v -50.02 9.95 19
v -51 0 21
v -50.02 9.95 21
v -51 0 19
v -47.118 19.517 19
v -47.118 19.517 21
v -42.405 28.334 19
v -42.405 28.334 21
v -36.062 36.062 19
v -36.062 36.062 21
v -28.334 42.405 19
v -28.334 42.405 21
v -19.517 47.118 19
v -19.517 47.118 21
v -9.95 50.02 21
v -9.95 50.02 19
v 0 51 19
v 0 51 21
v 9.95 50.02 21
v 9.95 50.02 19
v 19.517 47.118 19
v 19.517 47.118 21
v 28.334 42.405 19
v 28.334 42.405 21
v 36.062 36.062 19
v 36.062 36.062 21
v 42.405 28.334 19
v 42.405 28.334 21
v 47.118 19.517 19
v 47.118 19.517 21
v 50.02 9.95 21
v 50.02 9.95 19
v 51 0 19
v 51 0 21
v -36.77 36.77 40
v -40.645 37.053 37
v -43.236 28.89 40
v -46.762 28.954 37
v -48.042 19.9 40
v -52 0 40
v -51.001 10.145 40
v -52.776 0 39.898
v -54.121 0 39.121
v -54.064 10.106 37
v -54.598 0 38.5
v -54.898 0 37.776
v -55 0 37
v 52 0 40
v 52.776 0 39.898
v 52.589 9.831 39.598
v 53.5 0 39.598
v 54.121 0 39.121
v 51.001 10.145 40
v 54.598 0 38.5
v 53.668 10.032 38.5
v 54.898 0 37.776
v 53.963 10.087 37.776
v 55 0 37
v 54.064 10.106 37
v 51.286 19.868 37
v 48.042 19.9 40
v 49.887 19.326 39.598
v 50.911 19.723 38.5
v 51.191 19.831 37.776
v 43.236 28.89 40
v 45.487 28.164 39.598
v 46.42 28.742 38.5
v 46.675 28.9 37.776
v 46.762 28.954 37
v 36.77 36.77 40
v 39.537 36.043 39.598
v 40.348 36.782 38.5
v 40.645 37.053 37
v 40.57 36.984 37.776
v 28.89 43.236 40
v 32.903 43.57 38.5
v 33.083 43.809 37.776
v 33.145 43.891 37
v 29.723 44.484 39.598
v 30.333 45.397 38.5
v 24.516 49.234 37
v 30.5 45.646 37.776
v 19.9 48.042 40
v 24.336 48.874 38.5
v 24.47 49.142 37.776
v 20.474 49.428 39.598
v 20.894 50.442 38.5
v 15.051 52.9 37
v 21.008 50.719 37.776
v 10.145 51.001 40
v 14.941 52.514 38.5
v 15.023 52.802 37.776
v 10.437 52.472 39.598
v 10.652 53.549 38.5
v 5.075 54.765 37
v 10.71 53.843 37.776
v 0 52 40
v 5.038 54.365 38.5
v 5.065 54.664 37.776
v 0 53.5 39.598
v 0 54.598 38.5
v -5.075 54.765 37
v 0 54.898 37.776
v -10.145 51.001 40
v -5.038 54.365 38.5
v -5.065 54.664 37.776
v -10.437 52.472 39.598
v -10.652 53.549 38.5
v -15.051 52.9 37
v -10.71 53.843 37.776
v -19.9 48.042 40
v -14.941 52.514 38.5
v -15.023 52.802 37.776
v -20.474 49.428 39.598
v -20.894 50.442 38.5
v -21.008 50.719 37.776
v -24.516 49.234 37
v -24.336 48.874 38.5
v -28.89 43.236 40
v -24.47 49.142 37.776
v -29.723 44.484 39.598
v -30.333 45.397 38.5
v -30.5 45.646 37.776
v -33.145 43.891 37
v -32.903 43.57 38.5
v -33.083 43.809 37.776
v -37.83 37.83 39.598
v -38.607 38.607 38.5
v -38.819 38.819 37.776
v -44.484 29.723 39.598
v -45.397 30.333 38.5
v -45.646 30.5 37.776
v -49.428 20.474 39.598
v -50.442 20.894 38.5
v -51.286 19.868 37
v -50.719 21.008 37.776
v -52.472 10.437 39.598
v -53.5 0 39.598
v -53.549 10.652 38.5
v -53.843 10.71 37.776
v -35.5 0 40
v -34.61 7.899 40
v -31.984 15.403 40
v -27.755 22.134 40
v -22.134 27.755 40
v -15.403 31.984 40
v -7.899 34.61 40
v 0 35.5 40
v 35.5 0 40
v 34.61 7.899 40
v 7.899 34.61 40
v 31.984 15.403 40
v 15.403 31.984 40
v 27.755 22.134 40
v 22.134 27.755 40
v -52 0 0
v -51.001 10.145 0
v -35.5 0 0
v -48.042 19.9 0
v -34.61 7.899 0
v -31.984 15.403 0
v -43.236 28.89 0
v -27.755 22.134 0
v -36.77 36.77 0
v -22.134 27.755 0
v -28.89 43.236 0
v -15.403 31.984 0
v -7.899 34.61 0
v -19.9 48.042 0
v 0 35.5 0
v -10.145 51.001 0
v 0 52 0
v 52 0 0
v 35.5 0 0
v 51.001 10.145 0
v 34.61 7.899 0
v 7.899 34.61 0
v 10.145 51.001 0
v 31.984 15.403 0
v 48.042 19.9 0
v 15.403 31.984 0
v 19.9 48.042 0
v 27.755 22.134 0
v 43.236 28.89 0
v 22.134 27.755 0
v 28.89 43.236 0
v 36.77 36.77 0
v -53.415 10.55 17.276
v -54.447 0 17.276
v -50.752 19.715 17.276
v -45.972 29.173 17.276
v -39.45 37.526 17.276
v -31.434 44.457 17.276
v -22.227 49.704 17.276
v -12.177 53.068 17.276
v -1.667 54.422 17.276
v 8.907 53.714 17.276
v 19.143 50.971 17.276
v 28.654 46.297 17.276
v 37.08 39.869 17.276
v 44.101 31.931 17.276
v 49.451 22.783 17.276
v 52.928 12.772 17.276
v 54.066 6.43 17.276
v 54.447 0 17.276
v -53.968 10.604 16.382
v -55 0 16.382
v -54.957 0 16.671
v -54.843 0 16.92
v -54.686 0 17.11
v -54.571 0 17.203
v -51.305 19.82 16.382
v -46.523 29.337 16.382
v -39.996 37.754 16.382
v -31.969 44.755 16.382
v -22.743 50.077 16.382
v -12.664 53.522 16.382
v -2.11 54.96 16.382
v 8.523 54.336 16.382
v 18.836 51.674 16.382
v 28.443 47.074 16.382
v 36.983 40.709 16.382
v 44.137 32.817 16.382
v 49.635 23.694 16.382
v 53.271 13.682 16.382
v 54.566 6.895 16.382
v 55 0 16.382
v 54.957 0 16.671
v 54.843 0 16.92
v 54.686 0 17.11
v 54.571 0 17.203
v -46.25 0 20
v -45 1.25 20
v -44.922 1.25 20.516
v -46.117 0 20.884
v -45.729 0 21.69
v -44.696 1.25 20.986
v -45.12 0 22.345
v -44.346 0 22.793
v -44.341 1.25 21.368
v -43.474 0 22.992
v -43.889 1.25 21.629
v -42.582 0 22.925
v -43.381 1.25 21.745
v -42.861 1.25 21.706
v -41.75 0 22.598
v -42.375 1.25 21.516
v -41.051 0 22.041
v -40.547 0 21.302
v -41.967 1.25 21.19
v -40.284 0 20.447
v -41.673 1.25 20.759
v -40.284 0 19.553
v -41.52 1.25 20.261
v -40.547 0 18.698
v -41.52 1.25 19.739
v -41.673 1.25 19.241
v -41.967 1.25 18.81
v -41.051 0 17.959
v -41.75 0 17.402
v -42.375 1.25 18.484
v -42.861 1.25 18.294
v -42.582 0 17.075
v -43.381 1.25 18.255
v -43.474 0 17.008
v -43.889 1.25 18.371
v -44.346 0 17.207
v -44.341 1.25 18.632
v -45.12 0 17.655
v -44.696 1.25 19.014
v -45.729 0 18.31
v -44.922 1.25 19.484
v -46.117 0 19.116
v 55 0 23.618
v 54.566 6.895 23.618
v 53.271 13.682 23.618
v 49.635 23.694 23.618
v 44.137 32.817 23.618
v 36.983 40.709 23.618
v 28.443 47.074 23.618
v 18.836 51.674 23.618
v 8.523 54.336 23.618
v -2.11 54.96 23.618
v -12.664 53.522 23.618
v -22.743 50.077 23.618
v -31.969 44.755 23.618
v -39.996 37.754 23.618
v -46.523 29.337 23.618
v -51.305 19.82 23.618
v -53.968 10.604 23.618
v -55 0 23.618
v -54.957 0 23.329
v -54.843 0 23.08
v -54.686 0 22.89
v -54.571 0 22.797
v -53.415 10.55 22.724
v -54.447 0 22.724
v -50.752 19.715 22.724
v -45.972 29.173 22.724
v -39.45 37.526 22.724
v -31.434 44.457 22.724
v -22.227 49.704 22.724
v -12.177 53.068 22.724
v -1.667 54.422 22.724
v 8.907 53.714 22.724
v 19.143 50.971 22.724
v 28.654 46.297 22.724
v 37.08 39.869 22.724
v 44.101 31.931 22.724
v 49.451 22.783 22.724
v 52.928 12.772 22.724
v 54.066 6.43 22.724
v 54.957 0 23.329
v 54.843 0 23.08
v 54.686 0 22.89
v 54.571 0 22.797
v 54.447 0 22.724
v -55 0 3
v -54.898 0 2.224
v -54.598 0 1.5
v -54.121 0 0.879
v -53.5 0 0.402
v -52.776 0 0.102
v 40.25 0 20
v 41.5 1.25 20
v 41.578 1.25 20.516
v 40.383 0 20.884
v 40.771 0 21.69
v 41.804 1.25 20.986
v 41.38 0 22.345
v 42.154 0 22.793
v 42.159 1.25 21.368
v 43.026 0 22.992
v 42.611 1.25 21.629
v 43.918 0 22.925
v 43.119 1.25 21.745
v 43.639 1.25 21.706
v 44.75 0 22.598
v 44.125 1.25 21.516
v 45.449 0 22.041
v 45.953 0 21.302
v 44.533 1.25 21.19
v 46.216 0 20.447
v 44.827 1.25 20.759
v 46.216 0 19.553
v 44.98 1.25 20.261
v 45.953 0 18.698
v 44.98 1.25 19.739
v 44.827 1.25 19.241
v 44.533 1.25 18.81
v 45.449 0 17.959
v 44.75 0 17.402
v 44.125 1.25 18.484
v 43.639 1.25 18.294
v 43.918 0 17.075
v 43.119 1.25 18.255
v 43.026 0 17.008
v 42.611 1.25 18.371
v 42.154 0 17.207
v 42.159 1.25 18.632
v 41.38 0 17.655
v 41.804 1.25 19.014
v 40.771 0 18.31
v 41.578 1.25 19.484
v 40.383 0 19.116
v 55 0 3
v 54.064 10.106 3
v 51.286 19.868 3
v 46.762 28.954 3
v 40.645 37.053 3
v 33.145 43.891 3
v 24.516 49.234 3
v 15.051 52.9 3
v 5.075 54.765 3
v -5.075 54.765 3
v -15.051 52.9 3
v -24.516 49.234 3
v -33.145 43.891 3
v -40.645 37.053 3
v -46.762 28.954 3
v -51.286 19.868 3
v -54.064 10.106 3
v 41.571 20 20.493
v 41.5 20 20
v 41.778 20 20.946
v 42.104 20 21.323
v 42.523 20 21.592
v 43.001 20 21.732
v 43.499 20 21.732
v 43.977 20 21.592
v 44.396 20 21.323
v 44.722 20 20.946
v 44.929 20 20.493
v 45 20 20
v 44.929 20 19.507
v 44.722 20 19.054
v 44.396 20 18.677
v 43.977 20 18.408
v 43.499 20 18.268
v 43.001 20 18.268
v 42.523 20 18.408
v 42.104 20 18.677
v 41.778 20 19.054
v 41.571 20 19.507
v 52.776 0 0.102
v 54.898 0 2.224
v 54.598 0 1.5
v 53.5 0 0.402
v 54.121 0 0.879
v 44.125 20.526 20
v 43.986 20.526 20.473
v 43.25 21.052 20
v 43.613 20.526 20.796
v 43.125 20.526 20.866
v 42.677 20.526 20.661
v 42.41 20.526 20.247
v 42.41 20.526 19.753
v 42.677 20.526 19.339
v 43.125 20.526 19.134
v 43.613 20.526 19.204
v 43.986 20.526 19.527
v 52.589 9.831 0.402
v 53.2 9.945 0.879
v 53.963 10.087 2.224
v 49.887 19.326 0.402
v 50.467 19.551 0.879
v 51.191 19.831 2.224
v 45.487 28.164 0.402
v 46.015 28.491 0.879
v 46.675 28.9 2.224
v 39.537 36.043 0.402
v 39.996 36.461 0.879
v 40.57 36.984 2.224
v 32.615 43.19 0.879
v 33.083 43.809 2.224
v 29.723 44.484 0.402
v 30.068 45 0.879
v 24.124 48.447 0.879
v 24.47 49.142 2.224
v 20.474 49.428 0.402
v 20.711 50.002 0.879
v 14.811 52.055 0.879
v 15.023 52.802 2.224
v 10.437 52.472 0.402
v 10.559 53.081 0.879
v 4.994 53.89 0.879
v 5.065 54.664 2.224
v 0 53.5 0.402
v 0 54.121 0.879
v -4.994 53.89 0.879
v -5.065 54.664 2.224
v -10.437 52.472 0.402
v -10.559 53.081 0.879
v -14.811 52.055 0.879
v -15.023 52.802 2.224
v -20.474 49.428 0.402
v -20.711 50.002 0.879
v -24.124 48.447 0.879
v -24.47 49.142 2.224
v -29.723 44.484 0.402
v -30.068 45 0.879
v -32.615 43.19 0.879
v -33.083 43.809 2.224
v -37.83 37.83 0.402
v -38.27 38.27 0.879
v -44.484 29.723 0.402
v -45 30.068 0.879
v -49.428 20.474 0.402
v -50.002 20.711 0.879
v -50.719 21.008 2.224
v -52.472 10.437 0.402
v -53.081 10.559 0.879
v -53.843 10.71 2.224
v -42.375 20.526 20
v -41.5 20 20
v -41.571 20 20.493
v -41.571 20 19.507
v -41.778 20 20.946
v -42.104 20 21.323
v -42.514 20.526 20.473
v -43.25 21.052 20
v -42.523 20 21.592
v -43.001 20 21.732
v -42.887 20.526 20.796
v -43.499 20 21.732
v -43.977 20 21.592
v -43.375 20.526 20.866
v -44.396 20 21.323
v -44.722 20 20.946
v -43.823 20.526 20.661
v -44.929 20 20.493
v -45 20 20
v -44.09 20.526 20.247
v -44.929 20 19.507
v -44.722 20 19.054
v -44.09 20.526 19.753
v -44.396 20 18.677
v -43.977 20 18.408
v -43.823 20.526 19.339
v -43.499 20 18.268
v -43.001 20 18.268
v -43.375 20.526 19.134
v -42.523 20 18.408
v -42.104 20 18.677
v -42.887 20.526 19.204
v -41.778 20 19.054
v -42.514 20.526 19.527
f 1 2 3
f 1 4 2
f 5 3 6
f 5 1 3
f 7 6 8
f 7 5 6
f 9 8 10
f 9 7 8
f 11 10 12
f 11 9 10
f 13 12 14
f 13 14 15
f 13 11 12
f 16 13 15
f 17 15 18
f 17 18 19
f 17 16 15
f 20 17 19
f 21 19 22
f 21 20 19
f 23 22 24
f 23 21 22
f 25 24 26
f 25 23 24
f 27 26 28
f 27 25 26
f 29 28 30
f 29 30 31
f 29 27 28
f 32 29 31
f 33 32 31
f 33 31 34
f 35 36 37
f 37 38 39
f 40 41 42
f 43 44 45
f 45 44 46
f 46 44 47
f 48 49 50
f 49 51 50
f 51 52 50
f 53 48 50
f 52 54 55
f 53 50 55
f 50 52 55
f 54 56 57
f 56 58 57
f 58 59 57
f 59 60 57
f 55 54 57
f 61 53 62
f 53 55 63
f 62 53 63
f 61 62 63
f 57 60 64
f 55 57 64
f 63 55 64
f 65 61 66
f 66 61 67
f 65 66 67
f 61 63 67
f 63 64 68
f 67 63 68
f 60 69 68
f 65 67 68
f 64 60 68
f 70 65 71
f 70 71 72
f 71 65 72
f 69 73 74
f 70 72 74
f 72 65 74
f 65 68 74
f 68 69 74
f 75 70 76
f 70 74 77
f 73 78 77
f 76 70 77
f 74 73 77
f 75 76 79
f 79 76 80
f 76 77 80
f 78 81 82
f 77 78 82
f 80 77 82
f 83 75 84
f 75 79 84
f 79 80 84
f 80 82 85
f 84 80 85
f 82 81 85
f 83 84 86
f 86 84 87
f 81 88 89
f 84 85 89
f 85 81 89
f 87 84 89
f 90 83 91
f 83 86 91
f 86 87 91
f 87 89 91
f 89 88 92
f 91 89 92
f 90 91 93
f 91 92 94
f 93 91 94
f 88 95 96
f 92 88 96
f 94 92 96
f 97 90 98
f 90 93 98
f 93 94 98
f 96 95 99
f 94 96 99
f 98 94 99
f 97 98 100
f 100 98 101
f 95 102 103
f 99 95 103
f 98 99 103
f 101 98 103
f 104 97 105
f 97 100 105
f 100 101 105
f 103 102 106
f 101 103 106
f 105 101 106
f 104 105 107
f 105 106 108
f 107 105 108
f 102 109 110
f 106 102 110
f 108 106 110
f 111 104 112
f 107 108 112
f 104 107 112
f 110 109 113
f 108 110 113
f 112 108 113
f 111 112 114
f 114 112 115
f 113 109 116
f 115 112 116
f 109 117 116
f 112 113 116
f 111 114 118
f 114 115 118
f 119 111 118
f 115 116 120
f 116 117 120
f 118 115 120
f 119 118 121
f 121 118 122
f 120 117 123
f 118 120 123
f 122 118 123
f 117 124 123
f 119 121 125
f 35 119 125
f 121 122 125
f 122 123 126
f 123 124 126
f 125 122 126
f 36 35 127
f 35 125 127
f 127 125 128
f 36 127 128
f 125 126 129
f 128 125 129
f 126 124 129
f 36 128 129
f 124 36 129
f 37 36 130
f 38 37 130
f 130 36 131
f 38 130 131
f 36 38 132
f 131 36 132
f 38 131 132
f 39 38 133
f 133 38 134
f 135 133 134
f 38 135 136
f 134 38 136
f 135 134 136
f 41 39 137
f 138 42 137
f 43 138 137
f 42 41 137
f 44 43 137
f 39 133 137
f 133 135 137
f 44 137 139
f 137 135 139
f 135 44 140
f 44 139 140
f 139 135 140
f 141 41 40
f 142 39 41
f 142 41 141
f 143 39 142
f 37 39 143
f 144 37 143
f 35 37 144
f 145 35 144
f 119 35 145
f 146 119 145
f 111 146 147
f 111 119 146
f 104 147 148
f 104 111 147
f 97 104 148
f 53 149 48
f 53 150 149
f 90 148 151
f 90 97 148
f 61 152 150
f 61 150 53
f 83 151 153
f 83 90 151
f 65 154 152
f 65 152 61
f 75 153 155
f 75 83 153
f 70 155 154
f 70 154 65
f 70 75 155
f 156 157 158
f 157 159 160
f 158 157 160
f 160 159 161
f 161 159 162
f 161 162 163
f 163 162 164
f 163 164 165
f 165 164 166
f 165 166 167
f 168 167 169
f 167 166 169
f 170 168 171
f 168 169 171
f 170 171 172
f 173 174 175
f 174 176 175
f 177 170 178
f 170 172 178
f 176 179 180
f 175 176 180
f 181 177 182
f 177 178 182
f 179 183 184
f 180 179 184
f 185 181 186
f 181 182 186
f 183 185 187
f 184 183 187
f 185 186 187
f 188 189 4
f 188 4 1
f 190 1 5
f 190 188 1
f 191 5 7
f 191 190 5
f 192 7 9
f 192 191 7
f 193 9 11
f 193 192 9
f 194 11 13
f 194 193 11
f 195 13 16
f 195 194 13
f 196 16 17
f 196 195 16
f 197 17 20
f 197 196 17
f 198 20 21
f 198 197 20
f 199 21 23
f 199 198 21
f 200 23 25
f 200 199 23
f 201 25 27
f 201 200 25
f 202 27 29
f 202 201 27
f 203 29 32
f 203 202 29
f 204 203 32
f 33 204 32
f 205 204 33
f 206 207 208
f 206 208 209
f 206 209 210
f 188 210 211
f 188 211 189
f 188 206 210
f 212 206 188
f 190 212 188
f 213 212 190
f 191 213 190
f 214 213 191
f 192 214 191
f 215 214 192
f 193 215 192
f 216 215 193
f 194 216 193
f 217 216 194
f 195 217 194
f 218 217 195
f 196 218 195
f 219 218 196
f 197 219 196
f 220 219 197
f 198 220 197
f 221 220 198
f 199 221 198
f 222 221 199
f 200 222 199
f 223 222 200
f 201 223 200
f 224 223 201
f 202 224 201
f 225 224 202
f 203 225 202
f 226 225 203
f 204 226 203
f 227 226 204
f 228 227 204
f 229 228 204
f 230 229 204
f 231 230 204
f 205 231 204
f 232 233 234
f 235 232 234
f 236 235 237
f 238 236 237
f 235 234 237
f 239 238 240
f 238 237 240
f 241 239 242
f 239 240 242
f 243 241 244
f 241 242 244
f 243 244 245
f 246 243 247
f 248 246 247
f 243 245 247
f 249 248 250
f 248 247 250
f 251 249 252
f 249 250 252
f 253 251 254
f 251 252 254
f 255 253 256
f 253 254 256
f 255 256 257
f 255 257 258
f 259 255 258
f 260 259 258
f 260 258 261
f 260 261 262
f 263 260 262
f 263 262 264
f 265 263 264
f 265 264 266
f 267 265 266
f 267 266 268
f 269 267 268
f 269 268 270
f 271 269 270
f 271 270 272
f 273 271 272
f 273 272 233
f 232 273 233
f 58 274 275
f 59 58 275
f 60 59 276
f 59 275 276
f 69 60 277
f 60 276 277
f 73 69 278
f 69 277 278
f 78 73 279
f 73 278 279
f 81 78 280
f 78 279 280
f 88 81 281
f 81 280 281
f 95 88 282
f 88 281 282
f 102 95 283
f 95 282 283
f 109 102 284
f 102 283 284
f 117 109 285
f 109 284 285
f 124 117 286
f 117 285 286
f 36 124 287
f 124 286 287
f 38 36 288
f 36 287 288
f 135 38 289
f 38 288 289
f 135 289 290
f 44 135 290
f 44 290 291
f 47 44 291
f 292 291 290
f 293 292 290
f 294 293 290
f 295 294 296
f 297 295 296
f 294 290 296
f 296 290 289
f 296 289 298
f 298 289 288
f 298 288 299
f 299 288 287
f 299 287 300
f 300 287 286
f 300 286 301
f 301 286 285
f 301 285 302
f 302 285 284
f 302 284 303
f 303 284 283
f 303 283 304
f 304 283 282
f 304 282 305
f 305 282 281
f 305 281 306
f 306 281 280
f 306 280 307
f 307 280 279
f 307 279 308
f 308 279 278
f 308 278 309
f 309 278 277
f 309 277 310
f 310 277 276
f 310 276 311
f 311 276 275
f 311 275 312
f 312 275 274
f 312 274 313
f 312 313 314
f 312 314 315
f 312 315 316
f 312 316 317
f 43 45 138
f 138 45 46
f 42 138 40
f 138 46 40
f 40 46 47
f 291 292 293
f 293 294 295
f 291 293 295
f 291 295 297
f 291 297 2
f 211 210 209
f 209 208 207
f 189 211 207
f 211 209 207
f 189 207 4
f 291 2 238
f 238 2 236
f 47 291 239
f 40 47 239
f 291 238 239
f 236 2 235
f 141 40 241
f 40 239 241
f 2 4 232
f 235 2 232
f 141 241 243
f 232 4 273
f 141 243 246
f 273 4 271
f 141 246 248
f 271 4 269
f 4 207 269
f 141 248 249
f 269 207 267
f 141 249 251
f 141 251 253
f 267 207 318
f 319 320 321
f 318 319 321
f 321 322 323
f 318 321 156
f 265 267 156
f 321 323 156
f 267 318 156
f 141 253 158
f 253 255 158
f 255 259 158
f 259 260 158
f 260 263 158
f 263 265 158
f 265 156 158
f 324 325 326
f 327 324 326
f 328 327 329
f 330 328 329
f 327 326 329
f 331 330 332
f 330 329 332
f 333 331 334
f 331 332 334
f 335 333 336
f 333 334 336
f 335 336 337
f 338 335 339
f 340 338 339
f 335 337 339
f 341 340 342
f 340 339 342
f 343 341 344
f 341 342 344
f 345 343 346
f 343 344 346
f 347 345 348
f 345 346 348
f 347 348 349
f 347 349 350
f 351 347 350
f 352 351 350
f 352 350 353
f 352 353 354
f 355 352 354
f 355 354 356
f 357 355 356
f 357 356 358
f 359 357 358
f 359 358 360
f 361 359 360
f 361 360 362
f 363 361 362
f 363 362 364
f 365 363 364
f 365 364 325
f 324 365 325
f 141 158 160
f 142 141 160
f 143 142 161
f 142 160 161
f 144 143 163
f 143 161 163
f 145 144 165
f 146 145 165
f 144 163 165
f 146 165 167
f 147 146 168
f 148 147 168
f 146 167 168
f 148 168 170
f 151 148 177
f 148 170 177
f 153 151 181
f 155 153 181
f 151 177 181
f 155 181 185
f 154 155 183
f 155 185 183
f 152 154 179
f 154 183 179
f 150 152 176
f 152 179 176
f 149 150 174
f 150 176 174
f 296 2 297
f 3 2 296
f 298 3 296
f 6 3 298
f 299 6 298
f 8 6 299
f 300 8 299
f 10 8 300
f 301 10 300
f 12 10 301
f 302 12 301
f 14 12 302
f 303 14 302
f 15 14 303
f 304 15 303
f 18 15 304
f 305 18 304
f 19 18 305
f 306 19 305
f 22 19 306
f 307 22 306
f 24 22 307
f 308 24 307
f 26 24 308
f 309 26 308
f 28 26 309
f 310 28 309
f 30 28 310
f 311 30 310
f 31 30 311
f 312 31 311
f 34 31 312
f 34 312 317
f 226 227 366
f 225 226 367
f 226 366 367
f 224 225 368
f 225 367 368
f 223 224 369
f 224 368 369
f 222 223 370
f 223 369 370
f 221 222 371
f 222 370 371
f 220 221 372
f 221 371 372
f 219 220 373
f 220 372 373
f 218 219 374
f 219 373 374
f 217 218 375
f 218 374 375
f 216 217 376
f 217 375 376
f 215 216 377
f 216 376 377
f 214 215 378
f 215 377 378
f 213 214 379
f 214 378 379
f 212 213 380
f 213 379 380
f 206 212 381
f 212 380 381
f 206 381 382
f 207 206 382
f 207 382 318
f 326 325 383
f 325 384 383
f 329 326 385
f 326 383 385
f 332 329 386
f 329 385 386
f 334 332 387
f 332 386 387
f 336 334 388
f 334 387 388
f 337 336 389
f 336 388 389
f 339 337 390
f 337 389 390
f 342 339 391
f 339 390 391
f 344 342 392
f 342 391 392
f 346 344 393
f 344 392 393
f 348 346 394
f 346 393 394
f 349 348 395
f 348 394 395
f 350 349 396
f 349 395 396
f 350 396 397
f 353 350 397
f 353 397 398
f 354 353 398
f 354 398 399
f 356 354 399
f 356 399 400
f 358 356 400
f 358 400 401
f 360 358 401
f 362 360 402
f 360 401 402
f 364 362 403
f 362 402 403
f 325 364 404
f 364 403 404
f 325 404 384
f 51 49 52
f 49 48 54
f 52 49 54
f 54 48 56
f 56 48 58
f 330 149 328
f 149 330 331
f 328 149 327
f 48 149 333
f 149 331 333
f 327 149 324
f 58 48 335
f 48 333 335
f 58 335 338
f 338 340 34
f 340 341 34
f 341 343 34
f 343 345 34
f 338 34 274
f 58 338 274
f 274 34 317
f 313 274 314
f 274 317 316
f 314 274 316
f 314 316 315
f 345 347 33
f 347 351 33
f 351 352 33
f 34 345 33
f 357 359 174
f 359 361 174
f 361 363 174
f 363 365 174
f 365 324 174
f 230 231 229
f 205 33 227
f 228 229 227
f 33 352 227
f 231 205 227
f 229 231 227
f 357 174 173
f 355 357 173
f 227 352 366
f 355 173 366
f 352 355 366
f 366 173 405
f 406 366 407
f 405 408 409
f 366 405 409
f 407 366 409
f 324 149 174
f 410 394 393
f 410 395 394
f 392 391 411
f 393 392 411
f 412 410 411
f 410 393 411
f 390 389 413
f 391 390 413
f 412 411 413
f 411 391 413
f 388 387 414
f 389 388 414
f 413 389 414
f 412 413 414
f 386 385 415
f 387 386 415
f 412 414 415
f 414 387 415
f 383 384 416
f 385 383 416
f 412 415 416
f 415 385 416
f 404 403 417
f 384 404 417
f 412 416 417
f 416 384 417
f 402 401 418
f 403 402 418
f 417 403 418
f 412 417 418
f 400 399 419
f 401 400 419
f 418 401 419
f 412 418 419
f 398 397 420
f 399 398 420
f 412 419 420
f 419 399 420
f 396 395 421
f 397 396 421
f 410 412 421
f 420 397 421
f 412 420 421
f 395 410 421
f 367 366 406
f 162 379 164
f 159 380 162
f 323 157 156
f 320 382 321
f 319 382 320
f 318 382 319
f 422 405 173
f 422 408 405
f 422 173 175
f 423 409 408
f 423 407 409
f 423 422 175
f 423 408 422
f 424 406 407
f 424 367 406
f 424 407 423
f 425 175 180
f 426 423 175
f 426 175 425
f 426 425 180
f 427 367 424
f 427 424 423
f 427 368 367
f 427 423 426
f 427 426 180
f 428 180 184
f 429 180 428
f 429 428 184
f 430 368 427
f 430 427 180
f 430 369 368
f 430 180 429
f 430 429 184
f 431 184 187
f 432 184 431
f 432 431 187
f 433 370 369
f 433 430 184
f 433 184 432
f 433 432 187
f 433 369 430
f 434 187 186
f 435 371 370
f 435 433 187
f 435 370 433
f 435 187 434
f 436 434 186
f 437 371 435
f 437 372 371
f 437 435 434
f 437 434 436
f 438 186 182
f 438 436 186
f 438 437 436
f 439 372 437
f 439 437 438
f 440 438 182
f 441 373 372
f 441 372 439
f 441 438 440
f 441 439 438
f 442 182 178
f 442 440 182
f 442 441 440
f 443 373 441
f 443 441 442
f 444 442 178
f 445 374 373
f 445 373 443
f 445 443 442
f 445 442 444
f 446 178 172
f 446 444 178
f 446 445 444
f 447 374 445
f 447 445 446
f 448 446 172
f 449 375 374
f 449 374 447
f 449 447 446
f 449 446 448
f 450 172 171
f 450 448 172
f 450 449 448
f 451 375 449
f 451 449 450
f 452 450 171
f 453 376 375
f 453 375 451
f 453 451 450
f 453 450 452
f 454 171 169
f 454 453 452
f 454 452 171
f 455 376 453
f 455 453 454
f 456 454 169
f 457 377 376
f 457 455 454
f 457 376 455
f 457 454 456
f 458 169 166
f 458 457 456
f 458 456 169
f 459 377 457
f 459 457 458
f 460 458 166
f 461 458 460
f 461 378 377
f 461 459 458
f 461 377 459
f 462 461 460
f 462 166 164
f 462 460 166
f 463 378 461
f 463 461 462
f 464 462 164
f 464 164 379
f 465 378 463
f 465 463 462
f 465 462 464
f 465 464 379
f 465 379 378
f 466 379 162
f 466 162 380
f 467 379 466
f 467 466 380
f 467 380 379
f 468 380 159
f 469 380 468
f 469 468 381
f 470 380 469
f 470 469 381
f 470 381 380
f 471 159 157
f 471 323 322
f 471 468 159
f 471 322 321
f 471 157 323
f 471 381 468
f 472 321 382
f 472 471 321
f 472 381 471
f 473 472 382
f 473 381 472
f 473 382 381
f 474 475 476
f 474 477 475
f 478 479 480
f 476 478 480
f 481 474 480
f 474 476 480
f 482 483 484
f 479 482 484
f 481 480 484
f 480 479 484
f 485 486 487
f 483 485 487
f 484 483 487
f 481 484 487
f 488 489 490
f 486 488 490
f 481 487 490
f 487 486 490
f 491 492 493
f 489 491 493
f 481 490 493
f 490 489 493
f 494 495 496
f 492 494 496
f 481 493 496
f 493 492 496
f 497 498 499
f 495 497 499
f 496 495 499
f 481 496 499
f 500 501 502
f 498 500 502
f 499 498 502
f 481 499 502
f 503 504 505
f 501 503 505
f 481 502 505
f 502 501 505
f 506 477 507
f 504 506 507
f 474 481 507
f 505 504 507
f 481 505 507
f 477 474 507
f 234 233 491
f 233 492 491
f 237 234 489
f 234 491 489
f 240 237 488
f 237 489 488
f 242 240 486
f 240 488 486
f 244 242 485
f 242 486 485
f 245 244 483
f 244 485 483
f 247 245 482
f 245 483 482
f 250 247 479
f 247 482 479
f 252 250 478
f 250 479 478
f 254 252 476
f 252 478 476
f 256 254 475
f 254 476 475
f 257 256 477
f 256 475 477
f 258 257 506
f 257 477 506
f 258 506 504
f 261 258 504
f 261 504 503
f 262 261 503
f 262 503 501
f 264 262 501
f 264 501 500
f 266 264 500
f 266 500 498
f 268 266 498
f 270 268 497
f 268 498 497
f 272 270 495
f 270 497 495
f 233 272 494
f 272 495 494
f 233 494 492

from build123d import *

# Parameters (mm, degrees)
F1_DEPTH       = 40
F5_D           = 3.5
F5_DEPTH       = 20
F5_CSINK_D     = 6
F5_CSINK_ANGLE = 90
F5_TIP         = 1.0515060833
F7_D           = 3.5
F7_DEPTH       = 20
F7_CSINK_D     = 6
F7_CSINK_ANGLE = 90
F7_TIP         = 1.0515060833
F8_R           = 3
F9_R           = 1


with BuildPart() as f1:
    # F0 (on Top) → F1 (new body)
    with BuildSketch(Plane.XY):
        with BuildLine():
            ThreePointArc((-35.5, 0), (0, 35.5), (35.5, 0))
            Line((35.5, 0), (55, 0))
            ThreePointArc((55, 0), (0, 55), (-55, 0))
            Line((-55, 0), (-35.5, 0))
        make_face()
    extrude(amount=F1_DEPTH)

    # F2 (on face) → F3 (revolve, cut)
    with BuildSketch(Plane.XZ):
        Polygon((51, 20), (55, 20), (55, 23), (51, 21), align=None)
        Polygon((51, 19), (55, 17), (55, 20), (51, 20), align=None)
    revolve(axis=Axis((0, 0, 0), (0, 0, -1)), mode=Mode.SUBTRACT)

    # F5
    with Locations(Plane.XZ):
        with Locations((43.25, 20)):
            CounterSinkHole(F5_D / 2, F5_CSINK_D / 2, depth=F5_DEPTH, counter_sink_angle=F5_CSINK_ANGLE)
            with Locations((0, 0, -(F5_DEPTH + F5_TIP / 2))):  # 118° drill point
                Cone(0, F5_D / 2, F5_TIP, mode=Mode.SUBTRACT)

    # F7
    with Locations(Plane.XZ):
        with Locations((-43.25, 20)):
            CounterSinkHole(F7_D / 2, F7_CSINK_D / 2, depth=F7_DEPTH, counter_sink_angle=F7_CSINK_ANGLE)
            with Locations((0, 0, -(F7_DEPTH + F7_TIP / 2))):  # 118° drill point
                Cone(0, F7_D / 2, F7_TIP, mode=Mode.SUBTRACT)

    # F8
    f8_edges = [f1.edges().sort_by_distance(p)[0] for p in [
        (0, 55, 0),
        (0, 55, 40),
    ]]
    fillet(f8_edges, radius=F8_R)

    # F9
    f9_edges = [f1.edges().sort_by_distance(p)[0] for p in [
        (0, 55, 23),
        (0, 55, 17),
    ]]
    fillet(f9_edges, radius=F9_R)


solid = f1.part
